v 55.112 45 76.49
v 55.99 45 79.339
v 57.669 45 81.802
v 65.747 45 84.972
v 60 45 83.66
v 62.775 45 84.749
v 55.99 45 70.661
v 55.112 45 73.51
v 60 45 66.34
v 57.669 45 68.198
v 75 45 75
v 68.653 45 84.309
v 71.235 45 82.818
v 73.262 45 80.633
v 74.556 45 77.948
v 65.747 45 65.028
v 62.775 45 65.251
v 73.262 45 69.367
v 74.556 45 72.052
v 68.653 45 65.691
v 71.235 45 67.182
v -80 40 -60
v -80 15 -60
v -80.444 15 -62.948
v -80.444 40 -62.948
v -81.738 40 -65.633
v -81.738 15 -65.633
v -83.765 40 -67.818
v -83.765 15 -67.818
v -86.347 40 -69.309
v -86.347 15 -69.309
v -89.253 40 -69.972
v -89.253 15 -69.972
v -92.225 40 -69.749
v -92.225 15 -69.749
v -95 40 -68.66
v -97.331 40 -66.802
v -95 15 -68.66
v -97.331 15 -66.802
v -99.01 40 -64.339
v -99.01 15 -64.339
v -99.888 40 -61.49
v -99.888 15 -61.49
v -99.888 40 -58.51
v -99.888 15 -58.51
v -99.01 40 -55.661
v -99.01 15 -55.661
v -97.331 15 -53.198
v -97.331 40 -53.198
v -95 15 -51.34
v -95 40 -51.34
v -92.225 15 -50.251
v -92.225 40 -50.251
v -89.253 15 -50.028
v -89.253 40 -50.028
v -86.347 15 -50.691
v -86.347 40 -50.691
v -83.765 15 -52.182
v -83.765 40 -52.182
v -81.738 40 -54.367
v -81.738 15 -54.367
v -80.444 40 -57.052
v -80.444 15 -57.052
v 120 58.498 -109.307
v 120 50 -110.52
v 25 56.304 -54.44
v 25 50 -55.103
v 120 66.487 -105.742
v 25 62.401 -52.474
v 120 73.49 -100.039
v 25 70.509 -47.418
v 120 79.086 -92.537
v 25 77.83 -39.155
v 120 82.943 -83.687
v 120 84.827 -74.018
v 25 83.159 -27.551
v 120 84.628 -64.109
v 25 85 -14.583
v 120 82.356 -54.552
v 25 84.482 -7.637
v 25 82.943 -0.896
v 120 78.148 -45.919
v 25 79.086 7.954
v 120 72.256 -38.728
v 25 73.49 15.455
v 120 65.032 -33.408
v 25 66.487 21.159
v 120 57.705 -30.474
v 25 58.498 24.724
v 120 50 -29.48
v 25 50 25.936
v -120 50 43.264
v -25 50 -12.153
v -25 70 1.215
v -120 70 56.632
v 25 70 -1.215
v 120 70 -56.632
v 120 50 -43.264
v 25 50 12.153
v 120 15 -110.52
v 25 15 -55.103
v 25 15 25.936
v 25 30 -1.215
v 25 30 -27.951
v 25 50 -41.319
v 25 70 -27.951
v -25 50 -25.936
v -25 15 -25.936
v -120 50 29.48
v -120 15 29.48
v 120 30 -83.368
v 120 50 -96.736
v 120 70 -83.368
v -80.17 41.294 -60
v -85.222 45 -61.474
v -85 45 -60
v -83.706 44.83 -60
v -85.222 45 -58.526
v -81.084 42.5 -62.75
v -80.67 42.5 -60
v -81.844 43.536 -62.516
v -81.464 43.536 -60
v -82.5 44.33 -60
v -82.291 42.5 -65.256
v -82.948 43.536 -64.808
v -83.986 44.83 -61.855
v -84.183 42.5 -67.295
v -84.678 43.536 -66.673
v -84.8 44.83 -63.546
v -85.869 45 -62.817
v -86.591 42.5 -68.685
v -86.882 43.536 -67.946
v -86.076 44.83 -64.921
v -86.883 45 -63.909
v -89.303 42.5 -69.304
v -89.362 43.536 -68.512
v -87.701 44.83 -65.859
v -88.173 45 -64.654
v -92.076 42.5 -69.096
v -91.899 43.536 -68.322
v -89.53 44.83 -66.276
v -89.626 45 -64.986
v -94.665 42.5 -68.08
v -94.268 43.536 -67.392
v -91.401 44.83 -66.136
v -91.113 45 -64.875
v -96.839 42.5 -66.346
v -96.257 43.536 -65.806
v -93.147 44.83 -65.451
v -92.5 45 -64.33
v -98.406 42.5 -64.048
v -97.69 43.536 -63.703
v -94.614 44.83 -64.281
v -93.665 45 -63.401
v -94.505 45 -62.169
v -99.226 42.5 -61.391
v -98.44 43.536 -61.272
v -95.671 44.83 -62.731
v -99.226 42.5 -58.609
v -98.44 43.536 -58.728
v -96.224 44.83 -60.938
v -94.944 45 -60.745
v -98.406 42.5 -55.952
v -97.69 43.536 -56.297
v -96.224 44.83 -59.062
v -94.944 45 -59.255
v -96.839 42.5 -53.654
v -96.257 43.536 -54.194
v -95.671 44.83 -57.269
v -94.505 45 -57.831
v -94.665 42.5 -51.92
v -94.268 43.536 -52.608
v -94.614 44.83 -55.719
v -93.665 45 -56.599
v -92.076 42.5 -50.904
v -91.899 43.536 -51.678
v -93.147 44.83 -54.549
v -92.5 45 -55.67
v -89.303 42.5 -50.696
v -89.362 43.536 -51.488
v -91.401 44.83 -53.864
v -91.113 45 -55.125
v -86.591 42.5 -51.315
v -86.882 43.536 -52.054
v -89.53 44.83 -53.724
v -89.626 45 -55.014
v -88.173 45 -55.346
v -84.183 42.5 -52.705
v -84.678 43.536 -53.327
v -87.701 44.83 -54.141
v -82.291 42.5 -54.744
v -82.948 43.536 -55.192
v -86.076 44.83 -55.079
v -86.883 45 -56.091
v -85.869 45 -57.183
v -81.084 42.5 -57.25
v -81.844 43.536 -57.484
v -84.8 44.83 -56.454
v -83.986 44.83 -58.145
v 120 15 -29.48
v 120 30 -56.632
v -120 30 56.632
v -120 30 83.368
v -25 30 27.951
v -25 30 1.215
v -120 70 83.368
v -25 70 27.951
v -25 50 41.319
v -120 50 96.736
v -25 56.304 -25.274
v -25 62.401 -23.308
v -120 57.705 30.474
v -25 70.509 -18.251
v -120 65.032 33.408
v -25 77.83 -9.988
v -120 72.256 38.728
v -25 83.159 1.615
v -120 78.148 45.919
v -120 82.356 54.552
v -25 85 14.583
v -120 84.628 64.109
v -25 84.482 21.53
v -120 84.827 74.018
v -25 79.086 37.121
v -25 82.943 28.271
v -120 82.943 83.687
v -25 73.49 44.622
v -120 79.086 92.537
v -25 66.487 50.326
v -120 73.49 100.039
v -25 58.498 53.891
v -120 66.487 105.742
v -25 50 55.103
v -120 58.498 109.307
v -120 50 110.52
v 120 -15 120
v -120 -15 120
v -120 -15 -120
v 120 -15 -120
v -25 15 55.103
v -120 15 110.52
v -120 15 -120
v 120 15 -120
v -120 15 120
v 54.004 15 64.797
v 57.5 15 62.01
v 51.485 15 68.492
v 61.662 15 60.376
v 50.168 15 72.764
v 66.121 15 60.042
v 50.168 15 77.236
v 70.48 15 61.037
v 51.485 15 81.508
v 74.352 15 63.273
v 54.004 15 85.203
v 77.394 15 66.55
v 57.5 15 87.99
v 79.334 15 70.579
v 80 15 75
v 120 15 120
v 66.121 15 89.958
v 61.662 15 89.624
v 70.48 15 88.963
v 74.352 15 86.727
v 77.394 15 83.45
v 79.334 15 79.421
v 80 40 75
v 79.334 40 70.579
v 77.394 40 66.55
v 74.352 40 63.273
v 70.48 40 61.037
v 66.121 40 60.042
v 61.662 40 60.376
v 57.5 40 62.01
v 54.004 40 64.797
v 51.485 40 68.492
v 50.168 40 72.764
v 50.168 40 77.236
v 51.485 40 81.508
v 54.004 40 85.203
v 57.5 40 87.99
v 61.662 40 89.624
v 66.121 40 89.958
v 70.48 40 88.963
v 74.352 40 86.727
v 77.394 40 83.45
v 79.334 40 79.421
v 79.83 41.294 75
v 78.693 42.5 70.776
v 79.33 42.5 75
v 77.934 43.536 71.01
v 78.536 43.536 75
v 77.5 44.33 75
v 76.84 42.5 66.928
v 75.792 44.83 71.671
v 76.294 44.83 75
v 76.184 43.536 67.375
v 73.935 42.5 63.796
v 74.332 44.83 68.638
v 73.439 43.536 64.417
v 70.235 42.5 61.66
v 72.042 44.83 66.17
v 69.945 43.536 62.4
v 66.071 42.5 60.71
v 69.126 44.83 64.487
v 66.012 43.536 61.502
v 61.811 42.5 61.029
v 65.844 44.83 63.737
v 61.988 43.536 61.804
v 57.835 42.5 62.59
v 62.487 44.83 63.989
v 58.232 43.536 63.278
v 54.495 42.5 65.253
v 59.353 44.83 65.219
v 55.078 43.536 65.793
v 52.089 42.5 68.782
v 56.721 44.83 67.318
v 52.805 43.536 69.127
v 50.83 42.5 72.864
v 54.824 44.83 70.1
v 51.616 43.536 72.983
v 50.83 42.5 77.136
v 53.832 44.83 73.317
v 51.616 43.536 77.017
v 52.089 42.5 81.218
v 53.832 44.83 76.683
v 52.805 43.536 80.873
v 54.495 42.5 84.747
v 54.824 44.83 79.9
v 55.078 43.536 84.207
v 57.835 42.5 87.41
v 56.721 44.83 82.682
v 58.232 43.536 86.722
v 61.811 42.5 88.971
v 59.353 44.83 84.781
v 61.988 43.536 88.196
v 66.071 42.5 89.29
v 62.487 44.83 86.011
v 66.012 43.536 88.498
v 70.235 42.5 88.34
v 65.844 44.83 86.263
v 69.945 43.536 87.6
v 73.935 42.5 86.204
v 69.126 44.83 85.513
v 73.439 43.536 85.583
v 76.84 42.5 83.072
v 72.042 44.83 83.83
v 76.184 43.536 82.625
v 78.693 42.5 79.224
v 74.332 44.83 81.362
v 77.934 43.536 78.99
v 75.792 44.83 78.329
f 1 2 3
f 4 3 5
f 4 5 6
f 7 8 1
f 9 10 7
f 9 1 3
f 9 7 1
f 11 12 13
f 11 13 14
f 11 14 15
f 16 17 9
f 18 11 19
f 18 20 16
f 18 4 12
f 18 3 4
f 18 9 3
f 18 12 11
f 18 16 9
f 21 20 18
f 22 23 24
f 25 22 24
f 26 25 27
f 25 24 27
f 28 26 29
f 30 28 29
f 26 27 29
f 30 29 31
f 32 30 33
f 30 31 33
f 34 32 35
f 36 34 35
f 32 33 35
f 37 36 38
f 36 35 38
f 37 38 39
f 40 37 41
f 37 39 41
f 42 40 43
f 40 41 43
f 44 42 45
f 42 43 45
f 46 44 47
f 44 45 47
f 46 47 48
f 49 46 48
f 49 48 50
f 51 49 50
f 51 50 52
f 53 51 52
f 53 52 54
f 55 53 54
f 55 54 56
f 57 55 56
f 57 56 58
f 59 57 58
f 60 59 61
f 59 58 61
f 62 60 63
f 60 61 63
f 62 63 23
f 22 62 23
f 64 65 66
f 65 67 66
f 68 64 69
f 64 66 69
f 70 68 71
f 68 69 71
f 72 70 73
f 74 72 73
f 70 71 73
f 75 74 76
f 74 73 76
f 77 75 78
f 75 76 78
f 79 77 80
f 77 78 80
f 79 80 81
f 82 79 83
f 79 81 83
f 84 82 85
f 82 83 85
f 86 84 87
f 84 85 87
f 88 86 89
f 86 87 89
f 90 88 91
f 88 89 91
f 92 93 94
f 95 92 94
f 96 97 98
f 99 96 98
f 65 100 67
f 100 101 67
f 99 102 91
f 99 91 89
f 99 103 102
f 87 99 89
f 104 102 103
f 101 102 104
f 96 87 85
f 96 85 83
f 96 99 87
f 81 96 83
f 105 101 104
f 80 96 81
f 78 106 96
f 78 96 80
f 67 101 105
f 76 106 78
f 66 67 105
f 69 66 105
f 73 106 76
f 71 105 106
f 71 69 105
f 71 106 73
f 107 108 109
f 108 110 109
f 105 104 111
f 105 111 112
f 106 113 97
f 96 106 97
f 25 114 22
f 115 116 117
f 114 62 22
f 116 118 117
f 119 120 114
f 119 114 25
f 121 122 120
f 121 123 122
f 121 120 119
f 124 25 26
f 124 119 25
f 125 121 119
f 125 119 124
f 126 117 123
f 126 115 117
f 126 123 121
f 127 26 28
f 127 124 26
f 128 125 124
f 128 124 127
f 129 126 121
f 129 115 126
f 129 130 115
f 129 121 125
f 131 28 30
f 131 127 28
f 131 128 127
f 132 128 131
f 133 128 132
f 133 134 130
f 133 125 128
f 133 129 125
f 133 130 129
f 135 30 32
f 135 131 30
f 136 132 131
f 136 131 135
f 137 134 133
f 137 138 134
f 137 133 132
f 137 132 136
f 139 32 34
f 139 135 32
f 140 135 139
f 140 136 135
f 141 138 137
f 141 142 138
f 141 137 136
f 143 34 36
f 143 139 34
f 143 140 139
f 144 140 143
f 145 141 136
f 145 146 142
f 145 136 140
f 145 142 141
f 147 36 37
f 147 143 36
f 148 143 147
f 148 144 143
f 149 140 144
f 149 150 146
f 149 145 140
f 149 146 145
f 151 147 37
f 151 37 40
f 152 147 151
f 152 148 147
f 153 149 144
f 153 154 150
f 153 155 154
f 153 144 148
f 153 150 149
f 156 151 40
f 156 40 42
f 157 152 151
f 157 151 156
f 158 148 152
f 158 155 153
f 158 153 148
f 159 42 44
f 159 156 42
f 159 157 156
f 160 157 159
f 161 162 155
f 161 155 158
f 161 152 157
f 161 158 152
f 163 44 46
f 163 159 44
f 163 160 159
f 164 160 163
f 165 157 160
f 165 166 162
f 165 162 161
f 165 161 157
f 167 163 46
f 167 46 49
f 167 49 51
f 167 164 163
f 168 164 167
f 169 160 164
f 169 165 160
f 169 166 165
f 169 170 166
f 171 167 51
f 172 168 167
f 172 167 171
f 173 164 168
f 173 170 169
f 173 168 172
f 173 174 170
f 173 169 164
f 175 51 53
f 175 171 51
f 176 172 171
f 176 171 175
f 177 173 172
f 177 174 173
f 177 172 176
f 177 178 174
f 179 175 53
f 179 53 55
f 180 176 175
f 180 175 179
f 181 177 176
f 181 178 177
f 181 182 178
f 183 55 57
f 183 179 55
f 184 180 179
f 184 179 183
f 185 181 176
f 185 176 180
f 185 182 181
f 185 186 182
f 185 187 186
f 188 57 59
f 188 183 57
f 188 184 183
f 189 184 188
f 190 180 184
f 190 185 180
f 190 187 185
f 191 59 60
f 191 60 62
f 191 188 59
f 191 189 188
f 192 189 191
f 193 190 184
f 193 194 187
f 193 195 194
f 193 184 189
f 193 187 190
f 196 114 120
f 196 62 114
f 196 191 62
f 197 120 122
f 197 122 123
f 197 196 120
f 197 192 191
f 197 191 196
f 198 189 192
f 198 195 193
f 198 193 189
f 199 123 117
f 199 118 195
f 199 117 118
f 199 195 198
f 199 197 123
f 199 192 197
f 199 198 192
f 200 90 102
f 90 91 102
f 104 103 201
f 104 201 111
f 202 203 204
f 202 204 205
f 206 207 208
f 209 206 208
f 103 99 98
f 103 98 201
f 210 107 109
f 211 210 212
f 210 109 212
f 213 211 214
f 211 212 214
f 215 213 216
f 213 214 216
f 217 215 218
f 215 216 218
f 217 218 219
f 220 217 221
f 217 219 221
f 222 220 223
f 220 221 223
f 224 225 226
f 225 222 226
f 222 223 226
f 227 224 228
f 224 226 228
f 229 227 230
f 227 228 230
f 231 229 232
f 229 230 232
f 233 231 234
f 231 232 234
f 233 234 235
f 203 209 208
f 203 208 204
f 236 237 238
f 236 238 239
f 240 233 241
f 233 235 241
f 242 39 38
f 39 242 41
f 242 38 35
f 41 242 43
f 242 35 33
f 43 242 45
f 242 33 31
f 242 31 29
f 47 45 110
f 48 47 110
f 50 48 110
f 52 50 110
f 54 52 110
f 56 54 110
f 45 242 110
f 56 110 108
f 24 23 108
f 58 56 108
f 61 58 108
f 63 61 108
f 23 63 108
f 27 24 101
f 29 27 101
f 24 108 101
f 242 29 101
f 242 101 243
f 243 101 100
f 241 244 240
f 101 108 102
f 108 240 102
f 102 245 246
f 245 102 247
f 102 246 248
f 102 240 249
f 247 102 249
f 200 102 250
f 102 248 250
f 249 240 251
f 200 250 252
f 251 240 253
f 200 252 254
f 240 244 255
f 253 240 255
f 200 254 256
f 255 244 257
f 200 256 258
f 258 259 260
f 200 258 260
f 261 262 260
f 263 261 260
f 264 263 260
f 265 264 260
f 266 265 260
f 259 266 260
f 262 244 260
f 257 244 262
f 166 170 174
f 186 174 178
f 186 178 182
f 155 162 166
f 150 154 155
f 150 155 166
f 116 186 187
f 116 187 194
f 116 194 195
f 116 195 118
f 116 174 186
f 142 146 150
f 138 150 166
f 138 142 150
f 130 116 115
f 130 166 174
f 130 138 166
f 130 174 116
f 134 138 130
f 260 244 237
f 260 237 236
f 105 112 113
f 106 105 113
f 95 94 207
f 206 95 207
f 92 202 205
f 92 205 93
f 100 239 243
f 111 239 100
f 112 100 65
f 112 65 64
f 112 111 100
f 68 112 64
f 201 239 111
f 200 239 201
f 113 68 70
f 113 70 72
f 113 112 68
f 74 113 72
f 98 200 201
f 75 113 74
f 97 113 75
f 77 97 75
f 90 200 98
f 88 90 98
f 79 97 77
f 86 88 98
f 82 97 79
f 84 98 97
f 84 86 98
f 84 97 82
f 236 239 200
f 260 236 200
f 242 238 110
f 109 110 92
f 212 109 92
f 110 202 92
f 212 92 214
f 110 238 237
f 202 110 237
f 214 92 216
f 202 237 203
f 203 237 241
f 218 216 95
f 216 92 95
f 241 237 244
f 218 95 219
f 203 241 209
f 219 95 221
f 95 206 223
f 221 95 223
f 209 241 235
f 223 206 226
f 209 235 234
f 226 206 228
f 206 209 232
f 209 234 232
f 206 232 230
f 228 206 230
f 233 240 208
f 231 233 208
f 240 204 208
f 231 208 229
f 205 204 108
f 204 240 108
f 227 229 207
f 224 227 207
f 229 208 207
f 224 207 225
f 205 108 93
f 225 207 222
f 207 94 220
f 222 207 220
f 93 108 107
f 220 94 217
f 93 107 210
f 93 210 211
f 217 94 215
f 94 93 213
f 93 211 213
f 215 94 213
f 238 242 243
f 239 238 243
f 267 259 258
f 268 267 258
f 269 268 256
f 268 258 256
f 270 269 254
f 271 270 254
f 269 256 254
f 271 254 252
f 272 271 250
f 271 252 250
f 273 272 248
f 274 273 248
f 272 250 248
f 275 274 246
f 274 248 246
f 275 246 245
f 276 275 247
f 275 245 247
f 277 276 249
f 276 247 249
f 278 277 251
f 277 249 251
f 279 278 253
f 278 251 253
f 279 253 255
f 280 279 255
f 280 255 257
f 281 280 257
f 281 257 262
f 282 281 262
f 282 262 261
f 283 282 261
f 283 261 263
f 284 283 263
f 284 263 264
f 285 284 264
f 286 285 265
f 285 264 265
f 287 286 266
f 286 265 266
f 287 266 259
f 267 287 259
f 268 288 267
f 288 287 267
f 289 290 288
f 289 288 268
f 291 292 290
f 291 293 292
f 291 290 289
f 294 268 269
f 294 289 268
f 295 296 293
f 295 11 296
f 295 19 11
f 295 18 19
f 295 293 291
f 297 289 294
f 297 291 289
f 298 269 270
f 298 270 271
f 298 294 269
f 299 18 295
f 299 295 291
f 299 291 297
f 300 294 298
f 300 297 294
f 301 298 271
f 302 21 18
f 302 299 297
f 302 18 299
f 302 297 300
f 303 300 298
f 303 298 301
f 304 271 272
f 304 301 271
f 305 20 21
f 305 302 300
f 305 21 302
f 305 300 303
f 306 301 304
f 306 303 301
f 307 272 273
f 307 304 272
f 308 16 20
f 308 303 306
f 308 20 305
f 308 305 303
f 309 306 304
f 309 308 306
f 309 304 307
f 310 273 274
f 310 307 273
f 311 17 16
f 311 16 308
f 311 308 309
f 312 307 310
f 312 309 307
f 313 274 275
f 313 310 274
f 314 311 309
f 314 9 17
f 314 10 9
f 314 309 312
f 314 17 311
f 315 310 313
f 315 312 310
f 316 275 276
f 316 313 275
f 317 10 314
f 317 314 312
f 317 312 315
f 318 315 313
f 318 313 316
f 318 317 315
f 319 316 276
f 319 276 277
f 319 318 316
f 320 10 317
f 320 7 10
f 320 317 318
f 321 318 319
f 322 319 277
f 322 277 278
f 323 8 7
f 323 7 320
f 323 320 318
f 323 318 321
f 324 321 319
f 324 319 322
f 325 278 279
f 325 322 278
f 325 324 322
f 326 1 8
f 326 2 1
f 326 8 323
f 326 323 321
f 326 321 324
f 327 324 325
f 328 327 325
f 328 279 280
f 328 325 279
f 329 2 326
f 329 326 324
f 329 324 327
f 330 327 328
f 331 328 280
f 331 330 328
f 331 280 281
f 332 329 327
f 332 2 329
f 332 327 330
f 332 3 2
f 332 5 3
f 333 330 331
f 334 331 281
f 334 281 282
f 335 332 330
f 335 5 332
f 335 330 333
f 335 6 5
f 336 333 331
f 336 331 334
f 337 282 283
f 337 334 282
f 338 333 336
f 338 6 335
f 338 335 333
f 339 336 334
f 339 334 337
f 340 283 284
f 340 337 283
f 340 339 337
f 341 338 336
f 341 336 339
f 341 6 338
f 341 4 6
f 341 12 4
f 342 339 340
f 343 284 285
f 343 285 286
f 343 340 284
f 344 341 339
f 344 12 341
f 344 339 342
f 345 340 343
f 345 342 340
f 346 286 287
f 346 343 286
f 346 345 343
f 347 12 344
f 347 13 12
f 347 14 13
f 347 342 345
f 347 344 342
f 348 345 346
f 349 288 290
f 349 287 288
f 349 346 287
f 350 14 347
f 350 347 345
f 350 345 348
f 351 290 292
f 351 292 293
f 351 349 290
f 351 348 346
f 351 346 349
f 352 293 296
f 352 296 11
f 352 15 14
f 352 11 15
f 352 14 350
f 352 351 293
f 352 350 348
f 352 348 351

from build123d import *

# Parameters (mm, degrees)
SKETCH1_W                       = 240
SKETCH1_H                       = 30
BOSS_EXTRUDE2_DEPTH             = 120
BOSS_EXTRUDE3_REACH             = 166.118
BOSS_EXTRUDE3_DIRECTION_2_REACH = 166.118
SKETCH7_W                       = 50
SKETCH7_H                       = 70
CUT_EXTRUDE1_DEPTH              = 250
SKETCH8_R                       = 10
SKETCH8_R_2                     = 15
BOSS_EXTRUDE4_DEPTH             = 30
FILLET1_R                       = 5


with BuildPart() as part:
    # Sketch1 → Boss-Extrude2 (new body, symmetric)
    with BuildSketch(Plane.XY):
        Rectangle(SKETCH1_W, SKETCH1_H)
    extrude(amount=BOSS_EXTRUDE2_DEPTH, both=True)

    # Boss-Extrude3: up to this face of the body (flat: up to its plane)
    boss_extrude3_end = Plane(part.part.faces().sort_by_distance((-120, 0, 0))[0])
    # Sketch6 → Boss-Extrude3 (add, up to the picked face)
    with BuildSketch(Plane(origin=(0, 0, 0), x_dir=(-0.503871026, 0, -0.863778901), z_dir=(0.863778901, 0, -0.503871026)), mode=Mode.PRIVATE) as boss_extrude3_sk1:
        with BuildLine():
            Line((35, 0), (35, 50))
            ThreePointArc((35, 50), (0, 85), (-35, 50))
            Line((-35, 50), (-35, 0))
            Line((-35, 0), (35, 0))
        make_face()
        Polygon((23.094010768, 50), (11.547005384, 70), (-11.547005384, 70), (-23.094010768, 50), (-11.547005384, 30), (11.547005384, 30), align=None, mode=Mode.SUBTRACT)
    boss_extrude3_tool1 = split(extrude(boss_extrude3_sk1.sketch, amount=-BOSS_EXTRUDE3_REACH, mode=Mode.PRIVATE), bisect_by=boss_extrude3_end, keep=Keep.BOTH, mode=Mode.PRIVATE)
    add(boss_extrude3_tool1.solids().sort_by_distance((17.080655, 25, 29.281124))[0])

    # Boss-Extrude3 direction 2: up to this face of the body (flat: up to its plane)
    boss_extrude3_direction_2_end = Plane(part.part.faces().sort_by_distance((120, 0, 0))[0])
    # Sketch6 → Boss-Extrude3 direction 2 (add, up to the picked face)
    with BuildSketch(Plane(origin=(0, 0, 0), x_dir=(-0.503871026, 0, -0.863778901), z_dir=(0.863778901, 0, -0.503871026)), mode=Mode.PRIVATE) as boss_extrude3_direction_2_sk1:
        with BuildLine():
            Line((35, 0), (35, 50))
            ThreePointArc((35, 50), (0, 85), (-35, 50))
            Line((-35, 50), (-35, 0))
            Line((-35, 0), (35, 0))
        make_face()
        Polygon((23.094010768, 50), (11.547005384, 70), (-11.547005384, 70), (-23.094010768, 50), (-11.547005384, 30), (11.547005384, 30), align=None, mode=Mode.SUBTRACT)
    boss_extrude3_direction_2_tool1 = split(extrude(boss_extrude3_direction_2_sk1.sketch, amount=BOSS_EXTRUDE3_DIRECTION_2_REACH, mode=Mode.PRIVATE), bisect_by=boss_extrude3_direction_2_end, keep=Keep.BOTH, mode=Mode.PRIVATE)
    add(boss_extrude3_direction_2_tool1.solids().sort_by_distance((17.080655, 25, 29.281124))[0])

    # Sketch7 → Cut-Extrude1 (cut)
    with BuildSketch(Plane(origin=(0, 0, -70), x_dir=(-1, 0, 0), z_dir=(0, 0, -1))):
        with Locations((0, 50)):
            Rectangle(SKETCH7_W, SKETCH7_H)
    extrude(amount=-CUT_EXTRUDE1_DEPTH, mode=Mode.SUBTRACT)

    # Sketch8 → Boss-Extrude4 (add)
    with BuildSketch(Plane(origin=(0, 15, 0), x_dir=(1, 0, 0), z_dir=(0, 1, 0))):
        with Locations((-90, 60)):
            Circle(SKETCH8_R)
        with Locations((65, -75)):
            Circle(SKETCH8_R_2)
    extrude(amount=BOSS_EXTRUDE4_DEPTH)

    # Fillet1
    fillet1_edges = [part.edges().sort_by_distance(p)[0] for p in [
        (50, 45, 75),
        (-100, 45, -60),
    ]]
    fillet(fillet1_edges, radius=FILLET1_R)


solid = part.part
